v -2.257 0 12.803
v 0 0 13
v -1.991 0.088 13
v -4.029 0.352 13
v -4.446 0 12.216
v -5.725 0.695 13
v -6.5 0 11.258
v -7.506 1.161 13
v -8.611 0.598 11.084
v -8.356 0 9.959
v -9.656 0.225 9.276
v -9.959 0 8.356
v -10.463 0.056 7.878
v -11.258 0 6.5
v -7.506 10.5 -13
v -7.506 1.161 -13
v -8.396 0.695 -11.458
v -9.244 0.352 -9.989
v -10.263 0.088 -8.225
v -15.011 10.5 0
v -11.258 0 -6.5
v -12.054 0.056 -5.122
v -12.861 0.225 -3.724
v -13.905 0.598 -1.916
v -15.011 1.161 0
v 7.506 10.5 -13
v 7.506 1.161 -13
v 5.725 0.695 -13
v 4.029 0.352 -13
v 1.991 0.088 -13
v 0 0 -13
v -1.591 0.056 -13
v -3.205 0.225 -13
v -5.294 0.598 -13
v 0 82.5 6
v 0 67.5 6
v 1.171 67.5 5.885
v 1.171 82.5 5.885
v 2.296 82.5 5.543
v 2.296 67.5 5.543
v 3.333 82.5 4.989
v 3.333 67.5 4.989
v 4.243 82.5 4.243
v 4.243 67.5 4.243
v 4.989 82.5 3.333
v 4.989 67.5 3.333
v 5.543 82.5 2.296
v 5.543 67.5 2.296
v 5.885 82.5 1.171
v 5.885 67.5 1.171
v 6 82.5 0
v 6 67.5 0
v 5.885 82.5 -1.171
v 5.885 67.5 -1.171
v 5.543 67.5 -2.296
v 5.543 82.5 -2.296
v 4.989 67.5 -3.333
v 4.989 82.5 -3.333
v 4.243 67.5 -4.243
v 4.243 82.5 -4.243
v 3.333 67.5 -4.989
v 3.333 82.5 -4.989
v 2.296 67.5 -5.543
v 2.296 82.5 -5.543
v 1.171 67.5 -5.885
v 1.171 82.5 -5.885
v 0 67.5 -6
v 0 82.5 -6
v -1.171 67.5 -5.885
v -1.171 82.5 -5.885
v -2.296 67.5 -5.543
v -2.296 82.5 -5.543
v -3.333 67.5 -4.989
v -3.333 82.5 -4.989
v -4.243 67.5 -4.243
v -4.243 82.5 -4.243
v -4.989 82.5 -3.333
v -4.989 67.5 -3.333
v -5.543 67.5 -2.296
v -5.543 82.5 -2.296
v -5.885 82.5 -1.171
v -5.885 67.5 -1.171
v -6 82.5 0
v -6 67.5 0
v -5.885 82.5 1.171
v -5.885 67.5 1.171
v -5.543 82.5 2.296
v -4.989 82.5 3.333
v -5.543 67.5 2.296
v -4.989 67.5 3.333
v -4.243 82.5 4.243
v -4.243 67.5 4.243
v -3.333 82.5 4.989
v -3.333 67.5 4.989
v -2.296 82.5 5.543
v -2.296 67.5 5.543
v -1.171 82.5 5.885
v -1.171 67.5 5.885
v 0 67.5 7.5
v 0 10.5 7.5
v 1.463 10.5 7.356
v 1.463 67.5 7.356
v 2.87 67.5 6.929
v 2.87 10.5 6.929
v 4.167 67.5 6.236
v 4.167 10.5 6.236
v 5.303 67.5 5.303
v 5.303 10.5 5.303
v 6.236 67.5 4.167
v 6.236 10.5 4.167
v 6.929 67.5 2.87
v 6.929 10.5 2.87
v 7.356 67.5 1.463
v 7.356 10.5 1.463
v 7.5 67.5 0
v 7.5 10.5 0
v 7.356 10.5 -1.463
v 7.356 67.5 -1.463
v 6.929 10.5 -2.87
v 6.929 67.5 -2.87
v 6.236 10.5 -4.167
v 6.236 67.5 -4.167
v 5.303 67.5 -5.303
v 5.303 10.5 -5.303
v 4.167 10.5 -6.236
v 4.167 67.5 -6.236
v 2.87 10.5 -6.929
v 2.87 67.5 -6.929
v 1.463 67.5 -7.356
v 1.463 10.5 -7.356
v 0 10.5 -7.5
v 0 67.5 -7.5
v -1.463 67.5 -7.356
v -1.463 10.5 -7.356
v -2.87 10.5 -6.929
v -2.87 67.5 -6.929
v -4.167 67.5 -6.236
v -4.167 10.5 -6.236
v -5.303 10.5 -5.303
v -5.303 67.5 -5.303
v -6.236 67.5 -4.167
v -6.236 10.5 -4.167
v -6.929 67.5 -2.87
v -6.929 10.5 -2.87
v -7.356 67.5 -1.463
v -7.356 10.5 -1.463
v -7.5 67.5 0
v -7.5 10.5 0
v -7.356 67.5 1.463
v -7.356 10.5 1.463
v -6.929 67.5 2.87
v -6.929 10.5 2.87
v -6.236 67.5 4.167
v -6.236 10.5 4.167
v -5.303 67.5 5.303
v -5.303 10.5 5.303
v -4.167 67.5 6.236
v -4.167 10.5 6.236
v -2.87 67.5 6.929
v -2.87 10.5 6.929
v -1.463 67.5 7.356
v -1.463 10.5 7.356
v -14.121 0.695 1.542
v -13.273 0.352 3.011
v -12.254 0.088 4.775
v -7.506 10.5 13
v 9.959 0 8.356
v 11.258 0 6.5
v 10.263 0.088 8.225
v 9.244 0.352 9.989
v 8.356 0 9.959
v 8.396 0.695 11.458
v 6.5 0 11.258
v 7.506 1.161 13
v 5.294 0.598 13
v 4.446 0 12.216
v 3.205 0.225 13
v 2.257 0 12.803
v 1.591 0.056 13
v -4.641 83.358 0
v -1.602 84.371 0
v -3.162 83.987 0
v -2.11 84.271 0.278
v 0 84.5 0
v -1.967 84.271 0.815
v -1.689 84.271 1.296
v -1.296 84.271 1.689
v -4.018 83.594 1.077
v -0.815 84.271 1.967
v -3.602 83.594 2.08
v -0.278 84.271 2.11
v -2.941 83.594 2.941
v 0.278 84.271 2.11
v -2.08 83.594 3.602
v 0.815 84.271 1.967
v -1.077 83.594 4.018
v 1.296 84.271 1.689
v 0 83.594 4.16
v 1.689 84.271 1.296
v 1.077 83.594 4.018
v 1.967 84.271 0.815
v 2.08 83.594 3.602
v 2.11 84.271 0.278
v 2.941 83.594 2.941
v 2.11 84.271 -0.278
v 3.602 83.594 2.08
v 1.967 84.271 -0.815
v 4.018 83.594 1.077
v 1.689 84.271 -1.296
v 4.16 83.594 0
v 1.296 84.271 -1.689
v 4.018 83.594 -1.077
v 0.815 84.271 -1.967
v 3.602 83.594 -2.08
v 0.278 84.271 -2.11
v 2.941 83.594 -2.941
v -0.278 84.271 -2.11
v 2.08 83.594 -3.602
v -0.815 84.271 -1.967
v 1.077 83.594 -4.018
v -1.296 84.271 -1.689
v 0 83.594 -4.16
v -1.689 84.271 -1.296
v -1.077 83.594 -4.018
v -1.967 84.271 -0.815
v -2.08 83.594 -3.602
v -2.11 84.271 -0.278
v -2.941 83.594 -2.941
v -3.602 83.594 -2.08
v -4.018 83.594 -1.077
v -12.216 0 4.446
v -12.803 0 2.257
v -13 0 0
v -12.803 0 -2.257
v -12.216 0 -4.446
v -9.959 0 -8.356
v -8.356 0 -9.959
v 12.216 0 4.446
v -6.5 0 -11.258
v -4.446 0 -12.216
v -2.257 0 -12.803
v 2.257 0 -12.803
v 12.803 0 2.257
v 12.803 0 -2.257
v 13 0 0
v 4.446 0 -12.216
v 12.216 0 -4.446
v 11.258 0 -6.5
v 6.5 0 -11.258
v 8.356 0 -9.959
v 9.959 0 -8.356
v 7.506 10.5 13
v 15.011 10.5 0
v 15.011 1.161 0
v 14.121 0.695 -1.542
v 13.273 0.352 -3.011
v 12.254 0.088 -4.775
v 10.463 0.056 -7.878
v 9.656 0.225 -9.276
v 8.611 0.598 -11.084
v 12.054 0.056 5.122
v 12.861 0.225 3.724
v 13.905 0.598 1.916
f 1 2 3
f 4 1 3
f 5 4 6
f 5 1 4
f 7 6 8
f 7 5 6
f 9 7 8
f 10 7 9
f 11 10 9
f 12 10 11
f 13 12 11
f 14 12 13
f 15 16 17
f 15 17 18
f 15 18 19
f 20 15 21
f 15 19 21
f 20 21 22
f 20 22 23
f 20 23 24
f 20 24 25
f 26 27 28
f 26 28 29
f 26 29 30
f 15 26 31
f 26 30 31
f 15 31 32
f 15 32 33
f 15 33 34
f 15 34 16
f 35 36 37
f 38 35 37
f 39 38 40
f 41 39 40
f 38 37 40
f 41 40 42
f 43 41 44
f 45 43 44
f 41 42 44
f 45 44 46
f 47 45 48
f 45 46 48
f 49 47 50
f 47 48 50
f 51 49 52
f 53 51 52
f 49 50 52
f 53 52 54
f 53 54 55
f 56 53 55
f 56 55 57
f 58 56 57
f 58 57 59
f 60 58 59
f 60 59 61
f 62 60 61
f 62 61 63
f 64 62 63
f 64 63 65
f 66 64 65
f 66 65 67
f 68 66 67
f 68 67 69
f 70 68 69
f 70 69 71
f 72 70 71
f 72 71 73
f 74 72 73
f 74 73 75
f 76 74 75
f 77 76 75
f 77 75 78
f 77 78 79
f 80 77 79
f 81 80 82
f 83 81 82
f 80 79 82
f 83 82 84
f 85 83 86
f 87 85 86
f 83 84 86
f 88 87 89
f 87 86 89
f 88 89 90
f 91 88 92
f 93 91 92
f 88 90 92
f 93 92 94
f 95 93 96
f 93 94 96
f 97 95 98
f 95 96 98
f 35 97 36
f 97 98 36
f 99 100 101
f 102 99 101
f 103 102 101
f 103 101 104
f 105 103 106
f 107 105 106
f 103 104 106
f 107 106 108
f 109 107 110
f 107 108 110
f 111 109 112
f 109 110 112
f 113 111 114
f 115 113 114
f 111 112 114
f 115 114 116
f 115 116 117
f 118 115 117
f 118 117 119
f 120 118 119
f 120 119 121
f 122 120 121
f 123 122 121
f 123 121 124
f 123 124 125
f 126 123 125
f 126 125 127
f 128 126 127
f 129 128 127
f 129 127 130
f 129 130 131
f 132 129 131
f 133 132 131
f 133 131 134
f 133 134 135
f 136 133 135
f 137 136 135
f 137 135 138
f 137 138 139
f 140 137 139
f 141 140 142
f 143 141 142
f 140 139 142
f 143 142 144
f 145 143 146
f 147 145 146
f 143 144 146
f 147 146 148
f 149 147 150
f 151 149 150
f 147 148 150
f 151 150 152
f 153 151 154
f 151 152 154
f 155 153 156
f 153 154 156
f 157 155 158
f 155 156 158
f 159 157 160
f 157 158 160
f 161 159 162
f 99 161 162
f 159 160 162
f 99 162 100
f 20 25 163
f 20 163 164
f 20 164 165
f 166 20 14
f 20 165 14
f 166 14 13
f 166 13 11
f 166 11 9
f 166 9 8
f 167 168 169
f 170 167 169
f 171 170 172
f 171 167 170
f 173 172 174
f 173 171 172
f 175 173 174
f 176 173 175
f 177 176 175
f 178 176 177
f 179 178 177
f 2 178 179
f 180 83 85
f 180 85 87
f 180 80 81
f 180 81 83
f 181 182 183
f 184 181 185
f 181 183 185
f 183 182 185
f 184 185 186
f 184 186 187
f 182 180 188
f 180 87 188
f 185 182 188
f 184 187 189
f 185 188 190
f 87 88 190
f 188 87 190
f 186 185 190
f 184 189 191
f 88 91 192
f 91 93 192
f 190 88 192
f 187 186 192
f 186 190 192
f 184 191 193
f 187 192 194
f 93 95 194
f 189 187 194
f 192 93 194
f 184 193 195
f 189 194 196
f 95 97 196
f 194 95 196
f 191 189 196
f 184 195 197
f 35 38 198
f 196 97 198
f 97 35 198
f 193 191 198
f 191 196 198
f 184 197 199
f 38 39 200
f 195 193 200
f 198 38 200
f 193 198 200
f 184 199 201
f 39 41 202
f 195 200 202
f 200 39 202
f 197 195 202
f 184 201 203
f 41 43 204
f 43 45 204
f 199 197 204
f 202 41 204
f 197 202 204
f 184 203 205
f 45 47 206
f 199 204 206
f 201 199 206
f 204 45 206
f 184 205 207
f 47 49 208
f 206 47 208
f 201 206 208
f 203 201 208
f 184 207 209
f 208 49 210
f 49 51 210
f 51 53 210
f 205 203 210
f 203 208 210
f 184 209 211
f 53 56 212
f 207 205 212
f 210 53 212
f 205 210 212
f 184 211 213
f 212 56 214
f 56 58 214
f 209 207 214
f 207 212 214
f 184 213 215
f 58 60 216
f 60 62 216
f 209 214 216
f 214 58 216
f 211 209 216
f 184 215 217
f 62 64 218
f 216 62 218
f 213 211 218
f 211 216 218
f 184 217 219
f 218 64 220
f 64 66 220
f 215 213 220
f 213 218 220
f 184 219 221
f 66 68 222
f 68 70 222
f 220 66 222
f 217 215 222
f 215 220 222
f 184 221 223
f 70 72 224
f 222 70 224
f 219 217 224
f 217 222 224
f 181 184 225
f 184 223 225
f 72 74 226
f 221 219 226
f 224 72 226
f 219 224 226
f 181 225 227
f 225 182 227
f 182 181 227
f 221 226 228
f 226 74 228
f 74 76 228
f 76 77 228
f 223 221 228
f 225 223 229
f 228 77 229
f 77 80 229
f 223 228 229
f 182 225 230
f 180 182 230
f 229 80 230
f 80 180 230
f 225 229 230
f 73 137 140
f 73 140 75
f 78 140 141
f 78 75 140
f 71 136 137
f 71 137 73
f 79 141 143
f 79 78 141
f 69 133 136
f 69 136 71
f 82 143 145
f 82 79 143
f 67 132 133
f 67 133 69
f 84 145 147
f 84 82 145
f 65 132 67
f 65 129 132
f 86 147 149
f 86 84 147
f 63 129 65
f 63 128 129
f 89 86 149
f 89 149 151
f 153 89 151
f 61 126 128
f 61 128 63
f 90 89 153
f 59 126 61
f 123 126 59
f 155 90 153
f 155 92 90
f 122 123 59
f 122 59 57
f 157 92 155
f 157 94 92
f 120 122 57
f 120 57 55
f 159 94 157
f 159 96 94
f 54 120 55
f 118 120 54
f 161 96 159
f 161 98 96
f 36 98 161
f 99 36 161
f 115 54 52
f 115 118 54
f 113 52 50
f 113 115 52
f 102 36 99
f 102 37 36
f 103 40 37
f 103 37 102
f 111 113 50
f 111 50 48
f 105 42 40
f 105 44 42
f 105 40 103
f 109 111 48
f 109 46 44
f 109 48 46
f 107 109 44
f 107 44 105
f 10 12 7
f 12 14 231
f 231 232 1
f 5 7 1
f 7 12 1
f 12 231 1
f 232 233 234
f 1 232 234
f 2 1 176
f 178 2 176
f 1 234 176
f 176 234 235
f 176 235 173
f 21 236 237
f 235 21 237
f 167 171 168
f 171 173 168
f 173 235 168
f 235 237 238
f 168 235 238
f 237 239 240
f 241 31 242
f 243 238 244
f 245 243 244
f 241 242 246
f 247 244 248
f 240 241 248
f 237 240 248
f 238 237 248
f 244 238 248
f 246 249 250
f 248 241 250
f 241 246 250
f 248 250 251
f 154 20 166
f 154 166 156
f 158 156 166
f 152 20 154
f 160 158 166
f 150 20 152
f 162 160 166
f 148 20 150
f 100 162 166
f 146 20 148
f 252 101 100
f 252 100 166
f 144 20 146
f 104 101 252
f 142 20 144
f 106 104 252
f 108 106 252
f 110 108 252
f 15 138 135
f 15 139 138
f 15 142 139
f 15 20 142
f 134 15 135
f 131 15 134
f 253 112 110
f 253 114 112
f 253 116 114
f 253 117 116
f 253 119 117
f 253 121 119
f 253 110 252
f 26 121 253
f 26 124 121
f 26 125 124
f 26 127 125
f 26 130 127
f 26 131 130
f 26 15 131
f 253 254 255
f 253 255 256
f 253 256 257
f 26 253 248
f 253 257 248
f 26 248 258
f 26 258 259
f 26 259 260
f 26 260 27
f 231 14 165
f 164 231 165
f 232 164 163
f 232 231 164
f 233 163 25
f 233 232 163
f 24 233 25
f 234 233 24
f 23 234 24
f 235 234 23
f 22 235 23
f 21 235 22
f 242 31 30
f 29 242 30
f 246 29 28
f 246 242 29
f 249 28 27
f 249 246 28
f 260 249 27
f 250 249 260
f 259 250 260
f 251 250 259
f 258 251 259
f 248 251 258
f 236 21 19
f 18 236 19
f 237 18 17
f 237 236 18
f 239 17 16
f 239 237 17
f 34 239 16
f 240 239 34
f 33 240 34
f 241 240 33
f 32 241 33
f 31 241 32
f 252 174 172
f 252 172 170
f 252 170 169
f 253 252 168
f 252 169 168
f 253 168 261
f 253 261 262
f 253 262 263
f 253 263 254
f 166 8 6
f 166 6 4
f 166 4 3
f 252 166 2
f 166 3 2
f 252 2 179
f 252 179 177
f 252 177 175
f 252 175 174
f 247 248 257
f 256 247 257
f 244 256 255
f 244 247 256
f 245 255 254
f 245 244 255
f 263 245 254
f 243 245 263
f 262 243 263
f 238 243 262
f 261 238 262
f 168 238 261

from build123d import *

# Parameters (mm, degrees)
SKETCH1_R           = 7.5
BOSS_EXTRUDE1_DEPTH = 10.5
SKETCH1_3_R         = 7.5
SKETCH1_3_R_2       = 6
BOSS_EXTRUDE2_DEPTH = 67.5
SKETCH1_4_R         = 6
BOSS_EXTRUDE3_DEPTH = 82.5
SKETCH4_OUTSIDE_W   = 336.484
SKETCH4_OUTSIDE_H   = 332.462
SKETCH4_OUTSIDE_R   = 13
CUT_EXTRUDE1_DEPTH  = 82.5
CUT_EXTRUDE1_DRAFT  = -60


with BuildPart() as part:
    # Sketch1 → Boss-Extrude1 (new body)
    with BuildSketch(Plane(origin=(0, 0, 0), x_dir=(1, 0, 0), z_dir=(0, 1, 0))):
        Polygon((15.011106999, 0), (7.505553499, 13), (-7.505553499, 13), (-15.011106999, 0), (-7.505553499, -13), (7.505553499, -13), align=None)
        with Locations(Location((0, 0, 0), (0, 0, 270))):
            Circle(SKETCH1_R, mode=Mode.SUBTRACT)
    extrude(amount=BOSS_EXTRUDE1_DEPTH)

    # Sketch1<3> → Boss-Extrude2 (add)
    with BuildSketch(Plane(origin=(0, 0, 0), x_dir=(1, 0, 0), z_dir=(0, 1, 0))):
        with Locations(Location((0, 0, 0), (0, 0, 270))):
            Circle(SKETCH1_3_R)
        with Locations(Location((0, 0, 0), (0, 0, 270))):
            Circle(SKETCH1_3_R_2, mode=Mode.SUBTRACT)
    extrude(amount=BOSS_EXTRUDE2_DEPTH)

    # Sketch1<4> → Boss-Extrude3 (add)
    with BuildSketch(Plane(origin=(0, 0, 0), x_dir=(1, 0, 0), z_dir=(0, 1, 0))):
        with Locations(Location((0, 0, 0), (0, 0, 270))):
            Circle(SKETCH1_4_R)
    extrude(amount=BOSS_EXTRUDE3_DEPTH)

    # Sketch2 → Revolve1 (revolve)
    with BuildSketch(Plane.XY):
        with BuildLine():
            Line((0, 82.5), (0, 84.5))
            ThreePointArc((0, 84.5), (-3.16227766, 83.986832981), (-6, 82.5))
            Line((-6, 82.5), (0, 82.5))
        make_face()
    revolve(axis=Axis((0, 82.5, 0), (0, 1, 0)))


with BuildPart() as cut_extrude1_tool:
    # Sketch4 outside → Cut-Extrude1 (with draft: the straight prism first)
    with BuildSketch(Plane.XZ):
        Rectangle(SKETCH4_OUTSIDE_W, SKETCH4_OUTSIDE_H)
        Circle(SKETCH4_OUTSIDE_R, mode=Mode.SUBTRACT)
    extrude(amount=-CUT_EXTRUDE1_DEPTH)
    # Cut-Extrude1: the draft: its side faces are tilted about the plane it starts from
    cut_extrude1_sides = [cut_extrude1_tool.faces().sort_by_distance(p)[0] for p in [
        (0, 41.25, -166.231),
        (168.242, 41.25, 0),
        (0, 41.25, 166.231),
        (-168.242, 41.25, 0),
        (-13, 41.25, 0),
    ]]
    draft(cut_extrude1_sides, Plane.XZ, CUT_EXTRUDE1_DRAFT)


with BuildPart() as part_1:
    add(part.part)

    # Cut-Extrude1: cut by cut_extrude1_tool
    add(cut_extrude1_tool.part, mode=Mode.SUBTRACT)


solid = part_1.part
